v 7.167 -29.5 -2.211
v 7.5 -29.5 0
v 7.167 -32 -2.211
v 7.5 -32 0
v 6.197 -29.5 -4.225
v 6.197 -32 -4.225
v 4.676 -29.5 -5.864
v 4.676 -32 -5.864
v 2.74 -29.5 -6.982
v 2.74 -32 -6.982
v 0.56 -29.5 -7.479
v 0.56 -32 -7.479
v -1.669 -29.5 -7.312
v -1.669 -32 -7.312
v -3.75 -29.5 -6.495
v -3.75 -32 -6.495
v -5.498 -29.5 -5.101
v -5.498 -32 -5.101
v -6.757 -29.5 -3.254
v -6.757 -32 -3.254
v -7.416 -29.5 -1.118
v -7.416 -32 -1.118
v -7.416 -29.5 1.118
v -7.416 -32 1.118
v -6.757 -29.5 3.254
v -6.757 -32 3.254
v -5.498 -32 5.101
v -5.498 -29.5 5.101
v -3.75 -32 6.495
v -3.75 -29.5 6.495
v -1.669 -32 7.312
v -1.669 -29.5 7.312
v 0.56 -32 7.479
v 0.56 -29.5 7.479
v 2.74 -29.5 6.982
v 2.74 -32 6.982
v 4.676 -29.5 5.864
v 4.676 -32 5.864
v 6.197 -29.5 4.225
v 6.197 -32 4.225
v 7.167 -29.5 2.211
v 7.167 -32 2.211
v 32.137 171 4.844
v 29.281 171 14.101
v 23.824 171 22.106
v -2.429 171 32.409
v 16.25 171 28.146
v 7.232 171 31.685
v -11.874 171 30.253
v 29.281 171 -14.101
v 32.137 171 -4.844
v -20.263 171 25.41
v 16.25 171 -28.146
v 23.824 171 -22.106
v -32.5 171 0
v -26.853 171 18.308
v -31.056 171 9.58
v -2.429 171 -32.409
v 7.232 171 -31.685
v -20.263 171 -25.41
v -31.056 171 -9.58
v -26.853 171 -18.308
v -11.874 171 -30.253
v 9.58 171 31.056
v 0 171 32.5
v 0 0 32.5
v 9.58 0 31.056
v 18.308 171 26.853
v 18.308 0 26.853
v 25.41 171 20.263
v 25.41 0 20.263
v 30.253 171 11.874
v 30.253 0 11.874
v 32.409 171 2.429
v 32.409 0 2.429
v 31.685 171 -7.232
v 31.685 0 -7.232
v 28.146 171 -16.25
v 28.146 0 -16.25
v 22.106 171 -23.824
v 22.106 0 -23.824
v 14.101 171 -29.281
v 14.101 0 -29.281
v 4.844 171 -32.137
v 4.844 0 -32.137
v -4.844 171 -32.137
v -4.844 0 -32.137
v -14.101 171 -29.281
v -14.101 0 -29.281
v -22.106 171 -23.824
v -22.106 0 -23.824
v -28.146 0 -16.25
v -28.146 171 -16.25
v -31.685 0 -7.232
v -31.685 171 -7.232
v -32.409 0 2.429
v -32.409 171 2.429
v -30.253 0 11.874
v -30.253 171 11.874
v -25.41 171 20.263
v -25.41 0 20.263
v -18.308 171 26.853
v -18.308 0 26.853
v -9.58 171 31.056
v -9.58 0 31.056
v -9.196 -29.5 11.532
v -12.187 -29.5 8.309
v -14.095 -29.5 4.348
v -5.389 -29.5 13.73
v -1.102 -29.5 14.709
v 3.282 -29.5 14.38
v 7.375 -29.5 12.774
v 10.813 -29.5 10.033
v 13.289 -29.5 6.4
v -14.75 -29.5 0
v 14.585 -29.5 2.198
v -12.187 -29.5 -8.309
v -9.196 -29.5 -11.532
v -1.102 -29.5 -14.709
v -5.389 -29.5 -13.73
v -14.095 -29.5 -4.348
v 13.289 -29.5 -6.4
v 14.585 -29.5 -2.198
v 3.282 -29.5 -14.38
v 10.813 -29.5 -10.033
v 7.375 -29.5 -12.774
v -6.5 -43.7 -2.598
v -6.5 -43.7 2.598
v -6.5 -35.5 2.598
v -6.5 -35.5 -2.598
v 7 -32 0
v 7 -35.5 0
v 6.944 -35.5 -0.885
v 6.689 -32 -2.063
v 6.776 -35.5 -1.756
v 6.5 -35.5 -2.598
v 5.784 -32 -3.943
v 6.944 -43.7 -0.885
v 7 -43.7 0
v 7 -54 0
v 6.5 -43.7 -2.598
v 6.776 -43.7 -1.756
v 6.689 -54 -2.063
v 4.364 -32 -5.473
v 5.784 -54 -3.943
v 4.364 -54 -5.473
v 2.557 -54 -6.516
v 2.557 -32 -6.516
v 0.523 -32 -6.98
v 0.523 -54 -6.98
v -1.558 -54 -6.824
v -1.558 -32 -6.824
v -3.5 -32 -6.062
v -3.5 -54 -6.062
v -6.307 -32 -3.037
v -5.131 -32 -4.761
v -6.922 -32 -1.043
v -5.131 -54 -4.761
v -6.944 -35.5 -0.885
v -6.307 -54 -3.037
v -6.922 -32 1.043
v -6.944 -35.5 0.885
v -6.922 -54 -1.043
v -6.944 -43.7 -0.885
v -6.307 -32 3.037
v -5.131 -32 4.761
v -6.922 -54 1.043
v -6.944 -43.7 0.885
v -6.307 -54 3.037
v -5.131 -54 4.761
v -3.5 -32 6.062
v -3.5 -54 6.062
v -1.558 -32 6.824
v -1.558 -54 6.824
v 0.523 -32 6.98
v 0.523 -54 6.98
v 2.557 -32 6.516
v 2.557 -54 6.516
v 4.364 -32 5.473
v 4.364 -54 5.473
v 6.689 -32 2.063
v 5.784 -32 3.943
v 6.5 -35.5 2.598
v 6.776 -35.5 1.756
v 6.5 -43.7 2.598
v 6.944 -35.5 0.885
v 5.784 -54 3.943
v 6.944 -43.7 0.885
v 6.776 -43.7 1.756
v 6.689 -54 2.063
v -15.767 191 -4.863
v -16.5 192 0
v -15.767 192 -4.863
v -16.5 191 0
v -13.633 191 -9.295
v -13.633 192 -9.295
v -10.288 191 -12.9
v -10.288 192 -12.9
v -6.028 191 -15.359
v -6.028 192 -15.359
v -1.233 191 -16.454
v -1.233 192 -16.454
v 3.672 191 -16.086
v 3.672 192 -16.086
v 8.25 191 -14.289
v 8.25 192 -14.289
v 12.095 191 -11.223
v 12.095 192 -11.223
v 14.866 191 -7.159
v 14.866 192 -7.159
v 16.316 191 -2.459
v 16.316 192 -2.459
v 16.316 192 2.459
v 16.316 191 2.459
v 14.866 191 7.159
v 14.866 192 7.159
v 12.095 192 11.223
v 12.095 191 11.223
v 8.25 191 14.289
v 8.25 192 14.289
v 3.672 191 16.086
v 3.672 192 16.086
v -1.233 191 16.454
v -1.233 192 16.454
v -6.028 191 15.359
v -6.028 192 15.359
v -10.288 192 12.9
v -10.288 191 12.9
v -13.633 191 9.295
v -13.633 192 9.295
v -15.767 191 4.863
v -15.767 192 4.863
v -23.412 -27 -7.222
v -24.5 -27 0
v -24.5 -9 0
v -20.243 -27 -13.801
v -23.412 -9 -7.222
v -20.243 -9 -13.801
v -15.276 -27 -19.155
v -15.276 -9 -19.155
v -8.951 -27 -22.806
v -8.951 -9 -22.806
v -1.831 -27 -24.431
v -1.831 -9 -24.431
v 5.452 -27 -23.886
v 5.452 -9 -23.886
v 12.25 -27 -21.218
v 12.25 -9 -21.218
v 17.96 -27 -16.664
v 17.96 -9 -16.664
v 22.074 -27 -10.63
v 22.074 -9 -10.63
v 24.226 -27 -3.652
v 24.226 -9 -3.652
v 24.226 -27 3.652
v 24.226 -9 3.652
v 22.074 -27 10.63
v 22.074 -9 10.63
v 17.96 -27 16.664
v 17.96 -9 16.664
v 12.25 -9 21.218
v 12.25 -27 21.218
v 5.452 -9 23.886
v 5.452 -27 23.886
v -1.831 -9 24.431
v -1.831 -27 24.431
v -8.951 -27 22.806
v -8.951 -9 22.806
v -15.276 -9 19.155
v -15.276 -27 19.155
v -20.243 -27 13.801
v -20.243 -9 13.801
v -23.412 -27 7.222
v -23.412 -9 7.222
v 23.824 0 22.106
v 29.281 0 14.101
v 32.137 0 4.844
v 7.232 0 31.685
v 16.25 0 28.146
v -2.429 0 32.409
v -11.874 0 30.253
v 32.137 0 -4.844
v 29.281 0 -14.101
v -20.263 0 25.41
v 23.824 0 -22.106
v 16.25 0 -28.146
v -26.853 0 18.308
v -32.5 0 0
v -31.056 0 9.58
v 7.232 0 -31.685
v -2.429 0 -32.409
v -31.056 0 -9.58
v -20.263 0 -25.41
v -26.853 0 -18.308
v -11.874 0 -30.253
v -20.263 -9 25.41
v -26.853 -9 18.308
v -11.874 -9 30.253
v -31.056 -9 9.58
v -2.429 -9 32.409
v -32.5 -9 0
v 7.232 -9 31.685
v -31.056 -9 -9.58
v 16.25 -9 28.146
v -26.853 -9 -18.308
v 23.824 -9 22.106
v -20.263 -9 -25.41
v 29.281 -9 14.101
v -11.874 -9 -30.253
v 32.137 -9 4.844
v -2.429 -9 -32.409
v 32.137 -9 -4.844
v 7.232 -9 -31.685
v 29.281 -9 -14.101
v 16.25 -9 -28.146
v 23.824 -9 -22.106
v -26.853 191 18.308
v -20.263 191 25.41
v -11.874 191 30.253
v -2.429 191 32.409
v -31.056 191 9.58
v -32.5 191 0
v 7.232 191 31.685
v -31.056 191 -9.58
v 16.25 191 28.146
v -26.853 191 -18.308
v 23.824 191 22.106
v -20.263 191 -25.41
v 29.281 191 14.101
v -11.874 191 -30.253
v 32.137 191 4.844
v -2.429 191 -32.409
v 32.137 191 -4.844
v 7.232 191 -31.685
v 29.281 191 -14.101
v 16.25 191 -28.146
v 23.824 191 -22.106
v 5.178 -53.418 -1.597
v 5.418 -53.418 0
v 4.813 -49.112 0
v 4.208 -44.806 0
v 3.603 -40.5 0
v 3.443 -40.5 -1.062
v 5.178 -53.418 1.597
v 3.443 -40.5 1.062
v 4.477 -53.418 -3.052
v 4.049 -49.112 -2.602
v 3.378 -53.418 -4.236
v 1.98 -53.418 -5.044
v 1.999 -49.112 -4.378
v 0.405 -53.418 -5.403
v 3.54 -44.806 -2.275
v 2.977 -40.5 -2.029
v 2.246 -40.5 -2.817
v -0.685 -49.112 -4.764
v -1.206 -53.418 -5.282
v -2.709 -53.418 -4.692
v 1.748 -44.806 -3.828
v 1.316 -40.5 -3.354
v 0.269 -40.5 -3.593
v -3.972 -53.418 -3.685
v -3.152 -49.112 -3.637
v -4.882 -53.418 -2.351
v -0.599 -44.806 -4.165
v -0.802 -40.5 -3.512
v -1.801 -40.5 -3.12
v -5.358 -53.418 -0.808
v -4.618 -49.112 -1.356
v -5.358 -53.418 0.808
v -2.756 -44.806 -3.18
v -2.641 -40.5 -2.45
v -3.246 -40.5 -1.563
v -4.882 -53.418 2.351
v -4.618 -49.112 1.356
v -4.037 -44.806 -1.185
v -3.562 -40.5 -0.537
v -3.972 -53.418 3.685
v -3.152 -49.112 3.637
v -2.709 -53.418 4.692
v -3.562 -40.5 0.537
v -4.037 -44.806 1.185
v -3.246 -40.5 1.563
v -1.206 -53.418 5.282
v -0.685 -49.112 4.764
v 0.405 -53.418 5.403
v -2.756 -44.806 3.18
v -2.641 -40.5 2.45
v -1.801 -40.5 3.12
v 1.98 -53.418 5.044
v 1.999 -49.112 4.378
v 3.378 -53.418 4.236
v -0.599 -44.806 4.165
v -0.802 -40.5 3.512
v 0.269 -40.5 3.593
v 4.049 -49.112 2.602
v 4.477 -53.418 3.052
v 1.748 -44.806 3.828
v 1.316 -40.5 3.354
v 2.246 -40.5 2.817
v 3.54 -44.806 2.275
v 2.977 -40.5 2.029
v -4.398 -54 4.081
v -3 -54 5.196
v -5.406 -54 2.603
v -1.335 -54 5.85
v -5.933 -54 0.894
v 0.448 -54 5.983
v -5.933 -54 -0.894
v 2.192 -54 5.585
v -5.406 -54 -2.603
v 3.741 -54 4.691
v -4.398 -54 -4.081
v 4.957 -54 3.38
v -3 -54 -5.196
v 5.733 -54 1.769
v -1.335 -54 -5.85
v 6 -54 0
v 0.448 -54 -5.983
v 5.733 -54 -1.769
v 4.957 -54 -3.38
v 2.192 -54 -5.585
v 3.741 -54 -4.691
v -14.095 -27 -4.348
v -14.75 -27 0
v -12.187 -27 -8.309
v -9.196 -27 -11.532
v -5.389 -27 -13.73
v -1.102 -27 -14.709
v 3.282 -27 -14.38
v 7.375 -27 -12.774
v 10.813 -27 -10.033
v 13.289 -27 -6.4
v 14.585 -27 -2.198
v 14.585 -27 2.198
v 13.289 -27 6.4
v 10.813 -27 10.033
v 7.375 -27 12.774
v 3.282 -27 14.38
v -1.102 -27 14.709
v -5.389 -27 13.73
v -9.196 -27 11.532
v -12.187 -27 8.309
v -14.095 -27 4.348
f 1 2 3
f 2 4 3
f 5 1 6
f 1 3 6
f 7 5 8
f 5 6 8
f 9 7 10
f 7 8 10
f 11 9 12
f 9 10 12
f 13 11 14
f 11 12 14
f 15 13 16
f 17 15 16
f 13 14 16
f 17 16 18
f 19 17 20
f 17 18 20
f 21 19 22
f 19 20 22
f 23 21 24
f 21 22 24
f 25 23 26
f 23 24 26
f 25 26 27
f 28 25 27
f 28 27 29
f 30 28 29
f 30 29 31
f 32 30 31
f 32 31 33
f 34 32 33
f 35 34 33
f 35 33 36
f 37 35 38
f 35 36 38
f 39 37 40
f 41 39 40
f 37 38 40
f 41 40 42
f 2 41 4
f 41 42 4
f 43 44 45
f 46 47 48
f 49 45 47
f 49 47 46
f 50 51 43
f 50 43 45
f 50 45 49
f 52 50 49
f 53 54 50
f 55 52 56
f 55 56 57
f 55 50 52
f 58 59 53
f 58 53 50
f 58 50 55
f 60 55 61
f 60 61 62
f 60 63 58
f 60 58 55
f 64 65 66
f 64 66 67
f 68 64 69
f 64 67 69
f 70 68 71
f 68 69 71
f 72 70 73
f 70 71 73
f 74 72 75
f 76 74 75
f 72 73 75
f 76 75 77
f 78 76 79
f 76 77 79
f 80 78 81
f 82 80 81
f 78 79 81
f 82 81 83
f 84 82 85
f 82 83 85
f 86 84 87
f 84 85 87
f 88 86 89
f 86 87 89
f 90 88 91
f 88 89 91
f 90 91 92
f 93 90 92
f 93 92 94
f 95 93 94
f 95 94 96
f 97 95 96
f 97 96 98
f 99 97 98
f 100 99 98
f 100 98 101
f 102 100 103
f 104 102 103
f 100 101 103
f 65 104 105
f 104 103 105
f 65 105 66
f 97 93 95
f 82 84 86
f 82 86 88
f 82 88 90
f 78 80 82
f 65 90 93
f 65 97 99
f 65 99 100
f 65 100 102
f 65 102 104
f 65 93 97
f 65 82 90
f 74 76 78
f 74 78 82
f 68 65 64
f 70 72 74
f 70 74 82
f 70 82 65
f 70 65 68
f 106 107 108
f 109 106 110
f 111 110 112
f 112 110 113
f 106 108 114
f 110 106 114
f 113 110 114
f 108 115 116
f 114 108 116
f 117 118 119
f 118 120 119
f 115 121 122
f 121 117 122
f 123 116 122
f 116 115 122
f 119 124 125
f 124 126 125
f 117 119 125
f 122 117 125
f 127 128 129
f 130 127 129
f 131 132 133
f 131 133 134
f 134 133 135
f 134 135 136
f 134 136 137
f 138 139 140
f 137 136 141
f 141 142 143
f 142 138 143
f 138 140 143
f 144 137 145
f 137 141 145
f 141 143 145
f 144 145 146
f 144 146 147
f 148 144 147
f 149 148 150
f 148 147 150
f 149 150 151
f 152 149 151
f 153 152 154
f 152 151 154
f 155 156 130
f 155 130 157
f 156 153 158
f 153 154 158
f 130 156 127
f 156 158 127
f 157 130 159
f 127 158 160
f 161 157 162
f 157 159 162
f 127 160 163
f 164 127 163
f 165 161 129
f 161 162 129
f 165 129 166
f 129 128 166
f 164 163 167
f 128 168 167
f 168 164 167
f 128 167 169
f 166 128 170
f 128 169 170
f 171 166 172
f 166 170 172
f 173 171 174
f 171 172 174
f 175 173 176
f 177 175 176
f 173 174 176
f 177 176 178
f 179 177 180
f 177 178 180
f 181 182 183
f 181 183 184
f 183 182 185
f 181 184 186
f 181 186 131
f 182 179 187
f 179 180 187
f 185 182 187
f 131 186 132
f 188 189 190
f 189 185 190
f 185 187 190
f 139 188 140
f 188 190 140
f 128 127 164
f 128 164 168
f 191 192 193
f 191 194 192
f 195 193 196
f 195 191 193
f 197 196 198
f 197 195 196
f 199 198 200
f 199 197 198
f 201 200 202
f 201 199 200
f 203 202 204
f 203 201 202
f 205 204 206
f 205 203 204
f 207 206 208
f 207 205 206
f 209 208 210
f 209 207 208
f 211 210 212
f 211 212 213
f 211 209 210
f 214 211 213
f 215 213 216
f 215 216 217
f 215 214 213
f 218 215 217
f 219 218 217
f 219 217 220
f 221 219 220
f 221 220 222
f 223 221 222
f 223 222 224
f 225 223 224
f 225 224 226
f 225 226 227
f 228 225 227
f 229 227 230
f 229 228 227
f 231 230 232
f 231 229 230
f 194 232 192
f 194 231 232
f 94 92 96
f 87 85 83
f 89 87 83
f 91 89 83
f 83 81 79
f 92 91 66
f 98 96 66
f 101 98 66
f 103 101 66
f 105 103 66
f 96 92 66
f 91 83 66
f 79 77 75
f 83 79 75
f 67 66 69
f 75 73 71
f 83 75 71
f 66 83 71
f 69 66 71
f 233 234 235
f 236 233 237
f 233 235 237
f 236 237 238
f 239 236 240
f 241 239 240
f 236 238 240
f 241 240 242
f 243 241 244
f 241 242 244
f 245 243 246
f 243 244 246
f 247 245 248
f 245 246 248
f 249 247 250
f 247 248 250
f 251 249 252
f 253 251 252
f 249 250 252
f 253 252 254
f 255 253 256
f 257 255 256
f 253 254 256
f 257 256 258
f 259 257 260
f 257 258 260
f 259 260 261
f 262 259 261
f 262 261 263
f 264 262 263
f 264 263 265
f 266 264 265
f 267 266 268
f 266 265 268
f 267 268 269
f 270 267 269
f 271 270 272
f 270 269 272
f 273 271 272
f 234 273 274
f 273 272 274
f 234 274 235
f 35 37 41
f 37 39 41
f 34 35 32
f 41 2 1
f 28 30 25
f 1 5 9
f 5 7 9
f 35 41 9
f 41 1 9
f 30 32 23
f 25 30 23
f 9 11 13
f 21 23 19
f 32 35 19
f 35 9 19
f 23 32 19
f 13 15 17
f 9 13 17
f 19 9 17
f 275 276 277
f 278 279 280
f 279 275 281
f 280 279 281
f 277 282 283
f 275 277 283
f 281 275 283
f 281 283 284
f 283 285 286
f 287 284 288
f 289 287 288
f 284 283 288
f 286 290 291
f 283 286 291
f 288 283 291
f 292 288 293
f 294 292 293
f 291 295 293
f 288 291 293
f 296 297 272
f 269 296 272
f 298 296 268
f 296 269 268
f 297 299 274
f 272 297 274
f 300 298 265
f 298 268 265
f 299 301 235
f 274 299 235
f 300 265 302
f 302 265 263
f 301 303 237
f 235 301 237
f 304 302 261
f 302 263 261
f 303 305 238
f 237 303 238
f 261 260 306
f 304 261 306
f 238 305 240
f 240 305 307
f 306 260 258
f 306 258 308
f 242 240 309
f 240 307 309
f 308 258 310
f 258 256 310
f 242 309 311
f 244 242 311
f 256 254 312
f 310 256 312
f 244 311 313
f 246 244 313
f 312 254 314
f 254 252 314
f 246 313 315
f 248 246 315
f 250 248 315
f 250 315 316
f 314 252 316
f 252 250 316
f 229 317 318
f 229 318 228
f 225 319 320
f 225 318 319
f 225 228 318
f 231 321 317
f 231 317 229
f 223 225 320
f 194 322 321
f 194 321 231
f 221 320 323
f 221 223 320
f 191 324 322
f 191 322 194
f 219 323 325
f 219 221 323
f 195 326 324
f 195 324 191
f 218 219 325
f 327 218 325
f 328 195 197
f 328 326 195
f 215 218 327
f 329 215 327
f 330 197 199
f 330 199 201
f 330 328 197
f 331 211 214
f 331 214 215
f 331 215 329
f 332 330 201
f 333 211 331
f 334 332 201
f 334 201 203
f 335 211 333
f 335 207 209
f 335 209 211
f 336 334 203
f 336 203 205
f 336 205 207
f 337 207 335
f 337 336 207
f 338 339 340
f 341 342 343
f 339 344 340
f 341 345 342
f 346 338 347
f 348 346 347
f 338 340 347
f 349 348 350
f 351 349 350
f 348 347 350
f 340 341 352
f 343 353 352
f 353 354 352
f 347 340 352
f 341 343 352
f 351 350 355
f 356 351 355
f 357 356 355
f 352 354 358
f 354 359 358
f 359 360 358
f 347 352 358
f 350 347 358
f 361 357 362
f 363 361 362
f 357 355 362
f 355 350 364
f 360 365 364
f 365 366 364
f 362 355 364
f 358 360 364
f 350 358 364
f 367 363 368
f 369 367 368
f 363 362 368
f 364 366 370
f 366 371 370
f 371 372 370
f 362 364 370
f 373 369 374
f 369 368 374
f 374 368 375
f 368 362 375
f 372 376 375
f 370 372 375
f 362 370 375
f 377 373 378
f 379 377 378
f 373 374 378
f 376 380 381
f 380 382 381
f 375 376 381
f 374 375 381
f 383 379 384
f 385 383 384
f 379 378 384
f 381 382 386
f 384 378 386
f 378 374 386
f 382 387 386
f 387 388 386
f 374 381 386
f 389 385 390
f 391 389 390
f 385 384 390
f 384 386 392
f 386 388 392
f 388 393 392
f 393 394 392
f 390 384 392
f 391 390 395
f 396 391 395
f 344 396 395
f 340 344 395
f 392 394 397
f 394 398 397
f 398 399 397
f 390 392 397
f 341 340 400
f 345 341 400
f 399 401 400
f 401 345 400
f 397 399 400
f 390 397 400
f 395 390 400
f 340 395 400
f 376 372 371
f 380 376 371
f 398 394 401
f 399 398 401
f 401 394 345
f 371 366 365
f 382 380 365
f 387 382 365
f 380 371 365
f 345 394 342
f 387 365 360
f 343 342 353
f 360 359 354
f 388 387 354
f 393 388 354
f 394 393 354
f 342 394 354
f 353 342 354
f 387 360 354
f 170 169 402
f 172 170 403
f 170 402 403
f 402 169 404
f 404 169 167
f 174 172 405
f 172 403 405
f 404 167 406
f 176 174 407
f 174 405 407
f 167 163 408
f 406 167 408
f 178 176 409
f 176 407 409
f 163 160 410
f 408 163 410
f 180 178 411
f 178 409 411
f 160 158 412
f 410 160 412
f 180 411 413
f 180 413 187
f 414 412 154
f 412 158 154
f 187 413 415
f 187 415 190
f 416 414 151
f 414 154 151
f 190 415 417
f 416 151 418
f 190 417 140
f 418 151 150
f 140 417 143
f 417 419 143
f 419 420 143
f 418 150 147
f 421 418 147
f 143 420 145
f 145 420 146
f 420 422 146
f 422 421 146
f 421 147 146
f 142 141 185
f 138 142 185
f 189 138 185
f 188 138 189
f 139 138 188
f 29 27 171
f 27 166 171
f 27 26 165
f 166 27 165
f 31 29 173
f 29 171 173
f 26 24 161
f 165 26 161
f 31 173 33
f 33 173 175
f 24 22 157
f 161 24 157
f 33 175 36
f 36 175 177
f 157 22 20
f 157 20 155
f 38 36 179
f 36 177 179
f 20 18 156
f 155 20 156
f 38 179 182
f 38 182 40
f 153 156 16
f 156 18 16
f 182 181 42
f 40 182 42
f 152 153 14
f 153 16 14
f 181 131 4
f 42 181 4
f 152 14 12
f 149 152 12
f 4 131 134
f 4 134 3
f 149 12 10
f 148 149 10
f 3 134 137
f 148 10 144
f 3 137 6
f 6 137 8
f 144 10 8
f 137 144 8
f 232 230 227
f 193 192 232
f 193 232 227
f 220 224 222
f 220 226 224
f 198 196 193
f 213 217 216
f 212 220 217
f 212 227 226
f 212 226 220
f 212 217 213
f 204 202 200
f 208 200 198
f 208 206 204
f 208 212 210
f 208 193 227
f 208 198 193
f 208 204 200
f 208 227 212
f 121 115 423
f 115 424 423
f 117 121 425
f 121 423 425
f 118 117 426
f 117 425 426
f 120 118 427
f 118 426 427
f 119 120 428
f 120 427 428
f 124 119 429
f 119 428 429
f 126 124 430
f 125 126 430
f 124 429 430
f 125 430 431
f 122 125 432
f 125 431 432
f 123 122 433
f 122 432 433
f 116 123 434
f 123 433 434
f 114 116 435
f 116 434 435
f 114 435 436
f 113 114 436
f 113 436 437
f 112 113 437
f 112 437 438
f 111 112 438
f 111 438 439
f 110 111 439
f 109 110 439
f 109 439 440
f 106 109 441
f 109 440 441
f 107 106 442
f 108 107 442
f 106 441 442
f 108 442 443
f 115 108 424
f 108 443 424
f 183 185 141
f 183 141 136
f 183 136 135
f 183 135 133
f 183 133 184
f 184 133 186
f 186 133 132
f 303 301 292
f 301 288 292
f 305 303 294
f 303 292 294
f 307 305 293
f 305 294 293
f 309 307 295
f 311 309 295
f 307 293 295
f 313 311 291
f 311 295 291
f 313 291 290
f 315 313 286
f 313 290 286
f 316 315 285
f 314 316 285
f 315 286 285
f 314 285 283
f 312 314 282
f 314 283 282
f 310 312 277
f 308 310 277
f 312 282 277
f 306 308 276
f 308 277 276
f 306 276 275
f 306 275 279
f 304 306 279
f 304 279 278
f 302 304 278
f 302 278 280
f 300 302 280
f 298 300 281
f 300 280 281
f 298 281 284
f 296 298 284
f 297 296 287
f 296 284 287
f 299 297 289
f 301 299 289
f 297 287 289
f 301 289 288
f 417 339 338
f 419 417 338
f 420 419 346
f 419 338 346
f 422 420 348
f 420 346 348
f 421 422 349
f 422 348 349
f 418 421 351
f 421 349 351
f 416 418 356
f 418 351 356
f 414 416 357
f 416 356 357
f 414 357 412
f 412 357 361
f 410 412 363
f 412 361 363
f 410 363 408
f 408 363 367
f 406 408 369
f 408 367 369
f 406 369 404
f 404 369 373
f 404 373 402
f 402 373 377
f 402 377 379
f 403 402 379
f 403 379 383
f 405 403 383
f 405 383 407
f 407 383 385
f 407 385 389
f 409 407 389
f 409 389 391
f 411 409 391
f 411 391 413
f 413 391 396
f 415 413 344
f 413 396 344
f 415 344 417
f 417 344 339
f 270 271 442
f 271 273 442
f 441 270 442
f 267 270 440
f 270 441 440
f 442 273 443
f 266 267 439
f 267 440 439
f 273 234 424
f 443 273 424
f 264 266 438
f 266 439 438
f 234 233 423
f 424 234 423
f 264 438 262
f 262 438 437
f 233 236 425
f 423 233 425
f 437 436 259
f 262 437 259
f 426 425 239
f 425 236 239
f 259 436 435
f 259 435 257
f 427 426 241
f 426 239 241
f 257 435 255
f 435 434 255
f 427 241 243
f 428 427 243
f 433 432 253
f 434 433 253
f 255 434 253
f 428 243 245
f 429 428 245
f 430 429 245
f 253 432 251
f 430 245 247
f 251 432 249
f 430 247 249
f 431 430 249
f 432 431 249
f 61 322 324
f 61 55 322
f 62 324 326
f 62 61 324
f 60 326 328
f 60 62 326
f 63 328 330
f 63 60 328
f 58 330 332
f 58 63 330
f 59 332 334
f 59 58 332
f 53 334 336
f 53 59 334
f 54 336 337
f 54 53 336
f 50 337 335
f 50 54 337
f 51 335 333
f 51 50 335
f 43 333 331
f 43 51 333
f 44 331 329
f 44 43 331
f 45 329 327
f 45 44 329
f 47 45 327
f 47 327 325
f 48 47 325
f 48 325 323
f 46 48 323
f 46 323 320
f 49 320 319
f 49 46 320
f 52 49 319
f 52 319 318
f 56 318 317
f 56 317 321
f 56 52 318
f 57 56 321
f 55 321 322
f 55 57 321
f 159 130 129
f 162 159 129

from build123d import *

# Parameters (mm, degrees)
SKETCH_1_R          = 32.5
EXTRUDE_1_DEPTH     = 171
SKETCH_7_W          = 14.75
SKETCH_7_H          = 2.5
SKETCH_9_W          = 0.5
SKETCH_9_H          = 8.2
CUT_EXTRUDE_1_DEPTH = 198.424669178
CHAMFER_1_SIZE      = 0.5
CHAMFER_1_SIZE2     = 0.587478506


with BuildPart() as part:
    # Эскиз1 → Бобышка-Вытянуть1 (new body)
    with BuildSketch(Plane(origin=(0, 0, 0), x_dir=(1, 0, 0), z_dir=(0, 1, 0))):
        with Locations(Location((0, 0, 0), (0, 0, 270))):
            Circle(SKETCH_1_R)
    extrude(amount=EXTRUDE_1_DEPTH)


with BuildPart() as body_2:
    # Эскиз6 → Повернуть1 (revolve)
    with BuildSketch(Plane.XY, mode=Mode.PRIVATE) as revolve_1_sk:
        Polygon((0, 0), (0, -27), (24.5, -27), (24.5, -9), (32.5, -9), (32.5, 0), align=None)
        Polygon((0, 171), (0, 192), (16.5, 192), (16.5, 191), (32.5, 191), (32.5, 171), align=None)
    revolve(revolve_1_sk.sketch.rotate(Axis((0, 0, 0), (0, -1, 0)), 180), axis=Axis((0, 0, 0), (0, -1, 0)))

    # Эскиз7 → Повернуть2 (revolve)
    with BuildSketch(Plane.XY, mode=Mode.PRIVATE) as revolve_2_sk:
        with Locations((7.375, -28.25)):
            Rectangle(SKETCH_7_W, SKETCH_7_H)
    revolve(revolve_2_sk.sketch.rotate(Axis((0, -27, 0), (0, -1, 0)), 180), axis=Axis((0, -27, 0), (0, -1, 0)))


with BuildPart() as body_3:
    # Эскиз8 → Повернуть3 (revolve)
    with BuildSketch(Plane.XY):
        Polygon((7.5, -29.5), (7.5, -32), (7, -32), (7, -54), (5.5, -54), (3.602698732, -40.5), (0, -40.5), (0, -29.5), align=None)
    revolve(axis=Axis((0, -40.5, 0), (0, 1, 0)))

    # Эскиз9 → Вырез-Вытянуть1 (cut, symmetric)
    with BuildSketch(Plane.XY):
        with Locations((6.75, -39.6)):
            Rectangle(SKETCH_9_W, SKETCH_9_H)
    cut_extrude_1 = extrude(amount=CUT_EXTRUDE_1_DEPTH, both=True, mode=Mode.SUBTRACT)

    # Зеркальное отражение1: Вырез-Вытянуть1 across plane
    add(cut_extrude_1.mirror(Plane(origin=(0, 0, 0), x_dir=(0, 0, 1), z_dir=(1, 0, 0))), mode=Mode.SUBTRACT)

    # Фаска1
    chamfer_1_edges = [body_3.edges().sort_by_distance(p)[0] for p in [
        (-5.5, -54, 0),
    ]]
    chamfer_1_side = [body_3.faces().sort_by_distance(p)[0] for p in [
        (-6.802010101, -54, 0),
    ]]
    chamfer(chamfer_1_edges, length=CHAMFER_1_SIZE, length2=CHAMFER_1_SIZE2, reference=chamfer_1_side[0])


solid = Compound([part.part, body_2.part, body_3.part])
